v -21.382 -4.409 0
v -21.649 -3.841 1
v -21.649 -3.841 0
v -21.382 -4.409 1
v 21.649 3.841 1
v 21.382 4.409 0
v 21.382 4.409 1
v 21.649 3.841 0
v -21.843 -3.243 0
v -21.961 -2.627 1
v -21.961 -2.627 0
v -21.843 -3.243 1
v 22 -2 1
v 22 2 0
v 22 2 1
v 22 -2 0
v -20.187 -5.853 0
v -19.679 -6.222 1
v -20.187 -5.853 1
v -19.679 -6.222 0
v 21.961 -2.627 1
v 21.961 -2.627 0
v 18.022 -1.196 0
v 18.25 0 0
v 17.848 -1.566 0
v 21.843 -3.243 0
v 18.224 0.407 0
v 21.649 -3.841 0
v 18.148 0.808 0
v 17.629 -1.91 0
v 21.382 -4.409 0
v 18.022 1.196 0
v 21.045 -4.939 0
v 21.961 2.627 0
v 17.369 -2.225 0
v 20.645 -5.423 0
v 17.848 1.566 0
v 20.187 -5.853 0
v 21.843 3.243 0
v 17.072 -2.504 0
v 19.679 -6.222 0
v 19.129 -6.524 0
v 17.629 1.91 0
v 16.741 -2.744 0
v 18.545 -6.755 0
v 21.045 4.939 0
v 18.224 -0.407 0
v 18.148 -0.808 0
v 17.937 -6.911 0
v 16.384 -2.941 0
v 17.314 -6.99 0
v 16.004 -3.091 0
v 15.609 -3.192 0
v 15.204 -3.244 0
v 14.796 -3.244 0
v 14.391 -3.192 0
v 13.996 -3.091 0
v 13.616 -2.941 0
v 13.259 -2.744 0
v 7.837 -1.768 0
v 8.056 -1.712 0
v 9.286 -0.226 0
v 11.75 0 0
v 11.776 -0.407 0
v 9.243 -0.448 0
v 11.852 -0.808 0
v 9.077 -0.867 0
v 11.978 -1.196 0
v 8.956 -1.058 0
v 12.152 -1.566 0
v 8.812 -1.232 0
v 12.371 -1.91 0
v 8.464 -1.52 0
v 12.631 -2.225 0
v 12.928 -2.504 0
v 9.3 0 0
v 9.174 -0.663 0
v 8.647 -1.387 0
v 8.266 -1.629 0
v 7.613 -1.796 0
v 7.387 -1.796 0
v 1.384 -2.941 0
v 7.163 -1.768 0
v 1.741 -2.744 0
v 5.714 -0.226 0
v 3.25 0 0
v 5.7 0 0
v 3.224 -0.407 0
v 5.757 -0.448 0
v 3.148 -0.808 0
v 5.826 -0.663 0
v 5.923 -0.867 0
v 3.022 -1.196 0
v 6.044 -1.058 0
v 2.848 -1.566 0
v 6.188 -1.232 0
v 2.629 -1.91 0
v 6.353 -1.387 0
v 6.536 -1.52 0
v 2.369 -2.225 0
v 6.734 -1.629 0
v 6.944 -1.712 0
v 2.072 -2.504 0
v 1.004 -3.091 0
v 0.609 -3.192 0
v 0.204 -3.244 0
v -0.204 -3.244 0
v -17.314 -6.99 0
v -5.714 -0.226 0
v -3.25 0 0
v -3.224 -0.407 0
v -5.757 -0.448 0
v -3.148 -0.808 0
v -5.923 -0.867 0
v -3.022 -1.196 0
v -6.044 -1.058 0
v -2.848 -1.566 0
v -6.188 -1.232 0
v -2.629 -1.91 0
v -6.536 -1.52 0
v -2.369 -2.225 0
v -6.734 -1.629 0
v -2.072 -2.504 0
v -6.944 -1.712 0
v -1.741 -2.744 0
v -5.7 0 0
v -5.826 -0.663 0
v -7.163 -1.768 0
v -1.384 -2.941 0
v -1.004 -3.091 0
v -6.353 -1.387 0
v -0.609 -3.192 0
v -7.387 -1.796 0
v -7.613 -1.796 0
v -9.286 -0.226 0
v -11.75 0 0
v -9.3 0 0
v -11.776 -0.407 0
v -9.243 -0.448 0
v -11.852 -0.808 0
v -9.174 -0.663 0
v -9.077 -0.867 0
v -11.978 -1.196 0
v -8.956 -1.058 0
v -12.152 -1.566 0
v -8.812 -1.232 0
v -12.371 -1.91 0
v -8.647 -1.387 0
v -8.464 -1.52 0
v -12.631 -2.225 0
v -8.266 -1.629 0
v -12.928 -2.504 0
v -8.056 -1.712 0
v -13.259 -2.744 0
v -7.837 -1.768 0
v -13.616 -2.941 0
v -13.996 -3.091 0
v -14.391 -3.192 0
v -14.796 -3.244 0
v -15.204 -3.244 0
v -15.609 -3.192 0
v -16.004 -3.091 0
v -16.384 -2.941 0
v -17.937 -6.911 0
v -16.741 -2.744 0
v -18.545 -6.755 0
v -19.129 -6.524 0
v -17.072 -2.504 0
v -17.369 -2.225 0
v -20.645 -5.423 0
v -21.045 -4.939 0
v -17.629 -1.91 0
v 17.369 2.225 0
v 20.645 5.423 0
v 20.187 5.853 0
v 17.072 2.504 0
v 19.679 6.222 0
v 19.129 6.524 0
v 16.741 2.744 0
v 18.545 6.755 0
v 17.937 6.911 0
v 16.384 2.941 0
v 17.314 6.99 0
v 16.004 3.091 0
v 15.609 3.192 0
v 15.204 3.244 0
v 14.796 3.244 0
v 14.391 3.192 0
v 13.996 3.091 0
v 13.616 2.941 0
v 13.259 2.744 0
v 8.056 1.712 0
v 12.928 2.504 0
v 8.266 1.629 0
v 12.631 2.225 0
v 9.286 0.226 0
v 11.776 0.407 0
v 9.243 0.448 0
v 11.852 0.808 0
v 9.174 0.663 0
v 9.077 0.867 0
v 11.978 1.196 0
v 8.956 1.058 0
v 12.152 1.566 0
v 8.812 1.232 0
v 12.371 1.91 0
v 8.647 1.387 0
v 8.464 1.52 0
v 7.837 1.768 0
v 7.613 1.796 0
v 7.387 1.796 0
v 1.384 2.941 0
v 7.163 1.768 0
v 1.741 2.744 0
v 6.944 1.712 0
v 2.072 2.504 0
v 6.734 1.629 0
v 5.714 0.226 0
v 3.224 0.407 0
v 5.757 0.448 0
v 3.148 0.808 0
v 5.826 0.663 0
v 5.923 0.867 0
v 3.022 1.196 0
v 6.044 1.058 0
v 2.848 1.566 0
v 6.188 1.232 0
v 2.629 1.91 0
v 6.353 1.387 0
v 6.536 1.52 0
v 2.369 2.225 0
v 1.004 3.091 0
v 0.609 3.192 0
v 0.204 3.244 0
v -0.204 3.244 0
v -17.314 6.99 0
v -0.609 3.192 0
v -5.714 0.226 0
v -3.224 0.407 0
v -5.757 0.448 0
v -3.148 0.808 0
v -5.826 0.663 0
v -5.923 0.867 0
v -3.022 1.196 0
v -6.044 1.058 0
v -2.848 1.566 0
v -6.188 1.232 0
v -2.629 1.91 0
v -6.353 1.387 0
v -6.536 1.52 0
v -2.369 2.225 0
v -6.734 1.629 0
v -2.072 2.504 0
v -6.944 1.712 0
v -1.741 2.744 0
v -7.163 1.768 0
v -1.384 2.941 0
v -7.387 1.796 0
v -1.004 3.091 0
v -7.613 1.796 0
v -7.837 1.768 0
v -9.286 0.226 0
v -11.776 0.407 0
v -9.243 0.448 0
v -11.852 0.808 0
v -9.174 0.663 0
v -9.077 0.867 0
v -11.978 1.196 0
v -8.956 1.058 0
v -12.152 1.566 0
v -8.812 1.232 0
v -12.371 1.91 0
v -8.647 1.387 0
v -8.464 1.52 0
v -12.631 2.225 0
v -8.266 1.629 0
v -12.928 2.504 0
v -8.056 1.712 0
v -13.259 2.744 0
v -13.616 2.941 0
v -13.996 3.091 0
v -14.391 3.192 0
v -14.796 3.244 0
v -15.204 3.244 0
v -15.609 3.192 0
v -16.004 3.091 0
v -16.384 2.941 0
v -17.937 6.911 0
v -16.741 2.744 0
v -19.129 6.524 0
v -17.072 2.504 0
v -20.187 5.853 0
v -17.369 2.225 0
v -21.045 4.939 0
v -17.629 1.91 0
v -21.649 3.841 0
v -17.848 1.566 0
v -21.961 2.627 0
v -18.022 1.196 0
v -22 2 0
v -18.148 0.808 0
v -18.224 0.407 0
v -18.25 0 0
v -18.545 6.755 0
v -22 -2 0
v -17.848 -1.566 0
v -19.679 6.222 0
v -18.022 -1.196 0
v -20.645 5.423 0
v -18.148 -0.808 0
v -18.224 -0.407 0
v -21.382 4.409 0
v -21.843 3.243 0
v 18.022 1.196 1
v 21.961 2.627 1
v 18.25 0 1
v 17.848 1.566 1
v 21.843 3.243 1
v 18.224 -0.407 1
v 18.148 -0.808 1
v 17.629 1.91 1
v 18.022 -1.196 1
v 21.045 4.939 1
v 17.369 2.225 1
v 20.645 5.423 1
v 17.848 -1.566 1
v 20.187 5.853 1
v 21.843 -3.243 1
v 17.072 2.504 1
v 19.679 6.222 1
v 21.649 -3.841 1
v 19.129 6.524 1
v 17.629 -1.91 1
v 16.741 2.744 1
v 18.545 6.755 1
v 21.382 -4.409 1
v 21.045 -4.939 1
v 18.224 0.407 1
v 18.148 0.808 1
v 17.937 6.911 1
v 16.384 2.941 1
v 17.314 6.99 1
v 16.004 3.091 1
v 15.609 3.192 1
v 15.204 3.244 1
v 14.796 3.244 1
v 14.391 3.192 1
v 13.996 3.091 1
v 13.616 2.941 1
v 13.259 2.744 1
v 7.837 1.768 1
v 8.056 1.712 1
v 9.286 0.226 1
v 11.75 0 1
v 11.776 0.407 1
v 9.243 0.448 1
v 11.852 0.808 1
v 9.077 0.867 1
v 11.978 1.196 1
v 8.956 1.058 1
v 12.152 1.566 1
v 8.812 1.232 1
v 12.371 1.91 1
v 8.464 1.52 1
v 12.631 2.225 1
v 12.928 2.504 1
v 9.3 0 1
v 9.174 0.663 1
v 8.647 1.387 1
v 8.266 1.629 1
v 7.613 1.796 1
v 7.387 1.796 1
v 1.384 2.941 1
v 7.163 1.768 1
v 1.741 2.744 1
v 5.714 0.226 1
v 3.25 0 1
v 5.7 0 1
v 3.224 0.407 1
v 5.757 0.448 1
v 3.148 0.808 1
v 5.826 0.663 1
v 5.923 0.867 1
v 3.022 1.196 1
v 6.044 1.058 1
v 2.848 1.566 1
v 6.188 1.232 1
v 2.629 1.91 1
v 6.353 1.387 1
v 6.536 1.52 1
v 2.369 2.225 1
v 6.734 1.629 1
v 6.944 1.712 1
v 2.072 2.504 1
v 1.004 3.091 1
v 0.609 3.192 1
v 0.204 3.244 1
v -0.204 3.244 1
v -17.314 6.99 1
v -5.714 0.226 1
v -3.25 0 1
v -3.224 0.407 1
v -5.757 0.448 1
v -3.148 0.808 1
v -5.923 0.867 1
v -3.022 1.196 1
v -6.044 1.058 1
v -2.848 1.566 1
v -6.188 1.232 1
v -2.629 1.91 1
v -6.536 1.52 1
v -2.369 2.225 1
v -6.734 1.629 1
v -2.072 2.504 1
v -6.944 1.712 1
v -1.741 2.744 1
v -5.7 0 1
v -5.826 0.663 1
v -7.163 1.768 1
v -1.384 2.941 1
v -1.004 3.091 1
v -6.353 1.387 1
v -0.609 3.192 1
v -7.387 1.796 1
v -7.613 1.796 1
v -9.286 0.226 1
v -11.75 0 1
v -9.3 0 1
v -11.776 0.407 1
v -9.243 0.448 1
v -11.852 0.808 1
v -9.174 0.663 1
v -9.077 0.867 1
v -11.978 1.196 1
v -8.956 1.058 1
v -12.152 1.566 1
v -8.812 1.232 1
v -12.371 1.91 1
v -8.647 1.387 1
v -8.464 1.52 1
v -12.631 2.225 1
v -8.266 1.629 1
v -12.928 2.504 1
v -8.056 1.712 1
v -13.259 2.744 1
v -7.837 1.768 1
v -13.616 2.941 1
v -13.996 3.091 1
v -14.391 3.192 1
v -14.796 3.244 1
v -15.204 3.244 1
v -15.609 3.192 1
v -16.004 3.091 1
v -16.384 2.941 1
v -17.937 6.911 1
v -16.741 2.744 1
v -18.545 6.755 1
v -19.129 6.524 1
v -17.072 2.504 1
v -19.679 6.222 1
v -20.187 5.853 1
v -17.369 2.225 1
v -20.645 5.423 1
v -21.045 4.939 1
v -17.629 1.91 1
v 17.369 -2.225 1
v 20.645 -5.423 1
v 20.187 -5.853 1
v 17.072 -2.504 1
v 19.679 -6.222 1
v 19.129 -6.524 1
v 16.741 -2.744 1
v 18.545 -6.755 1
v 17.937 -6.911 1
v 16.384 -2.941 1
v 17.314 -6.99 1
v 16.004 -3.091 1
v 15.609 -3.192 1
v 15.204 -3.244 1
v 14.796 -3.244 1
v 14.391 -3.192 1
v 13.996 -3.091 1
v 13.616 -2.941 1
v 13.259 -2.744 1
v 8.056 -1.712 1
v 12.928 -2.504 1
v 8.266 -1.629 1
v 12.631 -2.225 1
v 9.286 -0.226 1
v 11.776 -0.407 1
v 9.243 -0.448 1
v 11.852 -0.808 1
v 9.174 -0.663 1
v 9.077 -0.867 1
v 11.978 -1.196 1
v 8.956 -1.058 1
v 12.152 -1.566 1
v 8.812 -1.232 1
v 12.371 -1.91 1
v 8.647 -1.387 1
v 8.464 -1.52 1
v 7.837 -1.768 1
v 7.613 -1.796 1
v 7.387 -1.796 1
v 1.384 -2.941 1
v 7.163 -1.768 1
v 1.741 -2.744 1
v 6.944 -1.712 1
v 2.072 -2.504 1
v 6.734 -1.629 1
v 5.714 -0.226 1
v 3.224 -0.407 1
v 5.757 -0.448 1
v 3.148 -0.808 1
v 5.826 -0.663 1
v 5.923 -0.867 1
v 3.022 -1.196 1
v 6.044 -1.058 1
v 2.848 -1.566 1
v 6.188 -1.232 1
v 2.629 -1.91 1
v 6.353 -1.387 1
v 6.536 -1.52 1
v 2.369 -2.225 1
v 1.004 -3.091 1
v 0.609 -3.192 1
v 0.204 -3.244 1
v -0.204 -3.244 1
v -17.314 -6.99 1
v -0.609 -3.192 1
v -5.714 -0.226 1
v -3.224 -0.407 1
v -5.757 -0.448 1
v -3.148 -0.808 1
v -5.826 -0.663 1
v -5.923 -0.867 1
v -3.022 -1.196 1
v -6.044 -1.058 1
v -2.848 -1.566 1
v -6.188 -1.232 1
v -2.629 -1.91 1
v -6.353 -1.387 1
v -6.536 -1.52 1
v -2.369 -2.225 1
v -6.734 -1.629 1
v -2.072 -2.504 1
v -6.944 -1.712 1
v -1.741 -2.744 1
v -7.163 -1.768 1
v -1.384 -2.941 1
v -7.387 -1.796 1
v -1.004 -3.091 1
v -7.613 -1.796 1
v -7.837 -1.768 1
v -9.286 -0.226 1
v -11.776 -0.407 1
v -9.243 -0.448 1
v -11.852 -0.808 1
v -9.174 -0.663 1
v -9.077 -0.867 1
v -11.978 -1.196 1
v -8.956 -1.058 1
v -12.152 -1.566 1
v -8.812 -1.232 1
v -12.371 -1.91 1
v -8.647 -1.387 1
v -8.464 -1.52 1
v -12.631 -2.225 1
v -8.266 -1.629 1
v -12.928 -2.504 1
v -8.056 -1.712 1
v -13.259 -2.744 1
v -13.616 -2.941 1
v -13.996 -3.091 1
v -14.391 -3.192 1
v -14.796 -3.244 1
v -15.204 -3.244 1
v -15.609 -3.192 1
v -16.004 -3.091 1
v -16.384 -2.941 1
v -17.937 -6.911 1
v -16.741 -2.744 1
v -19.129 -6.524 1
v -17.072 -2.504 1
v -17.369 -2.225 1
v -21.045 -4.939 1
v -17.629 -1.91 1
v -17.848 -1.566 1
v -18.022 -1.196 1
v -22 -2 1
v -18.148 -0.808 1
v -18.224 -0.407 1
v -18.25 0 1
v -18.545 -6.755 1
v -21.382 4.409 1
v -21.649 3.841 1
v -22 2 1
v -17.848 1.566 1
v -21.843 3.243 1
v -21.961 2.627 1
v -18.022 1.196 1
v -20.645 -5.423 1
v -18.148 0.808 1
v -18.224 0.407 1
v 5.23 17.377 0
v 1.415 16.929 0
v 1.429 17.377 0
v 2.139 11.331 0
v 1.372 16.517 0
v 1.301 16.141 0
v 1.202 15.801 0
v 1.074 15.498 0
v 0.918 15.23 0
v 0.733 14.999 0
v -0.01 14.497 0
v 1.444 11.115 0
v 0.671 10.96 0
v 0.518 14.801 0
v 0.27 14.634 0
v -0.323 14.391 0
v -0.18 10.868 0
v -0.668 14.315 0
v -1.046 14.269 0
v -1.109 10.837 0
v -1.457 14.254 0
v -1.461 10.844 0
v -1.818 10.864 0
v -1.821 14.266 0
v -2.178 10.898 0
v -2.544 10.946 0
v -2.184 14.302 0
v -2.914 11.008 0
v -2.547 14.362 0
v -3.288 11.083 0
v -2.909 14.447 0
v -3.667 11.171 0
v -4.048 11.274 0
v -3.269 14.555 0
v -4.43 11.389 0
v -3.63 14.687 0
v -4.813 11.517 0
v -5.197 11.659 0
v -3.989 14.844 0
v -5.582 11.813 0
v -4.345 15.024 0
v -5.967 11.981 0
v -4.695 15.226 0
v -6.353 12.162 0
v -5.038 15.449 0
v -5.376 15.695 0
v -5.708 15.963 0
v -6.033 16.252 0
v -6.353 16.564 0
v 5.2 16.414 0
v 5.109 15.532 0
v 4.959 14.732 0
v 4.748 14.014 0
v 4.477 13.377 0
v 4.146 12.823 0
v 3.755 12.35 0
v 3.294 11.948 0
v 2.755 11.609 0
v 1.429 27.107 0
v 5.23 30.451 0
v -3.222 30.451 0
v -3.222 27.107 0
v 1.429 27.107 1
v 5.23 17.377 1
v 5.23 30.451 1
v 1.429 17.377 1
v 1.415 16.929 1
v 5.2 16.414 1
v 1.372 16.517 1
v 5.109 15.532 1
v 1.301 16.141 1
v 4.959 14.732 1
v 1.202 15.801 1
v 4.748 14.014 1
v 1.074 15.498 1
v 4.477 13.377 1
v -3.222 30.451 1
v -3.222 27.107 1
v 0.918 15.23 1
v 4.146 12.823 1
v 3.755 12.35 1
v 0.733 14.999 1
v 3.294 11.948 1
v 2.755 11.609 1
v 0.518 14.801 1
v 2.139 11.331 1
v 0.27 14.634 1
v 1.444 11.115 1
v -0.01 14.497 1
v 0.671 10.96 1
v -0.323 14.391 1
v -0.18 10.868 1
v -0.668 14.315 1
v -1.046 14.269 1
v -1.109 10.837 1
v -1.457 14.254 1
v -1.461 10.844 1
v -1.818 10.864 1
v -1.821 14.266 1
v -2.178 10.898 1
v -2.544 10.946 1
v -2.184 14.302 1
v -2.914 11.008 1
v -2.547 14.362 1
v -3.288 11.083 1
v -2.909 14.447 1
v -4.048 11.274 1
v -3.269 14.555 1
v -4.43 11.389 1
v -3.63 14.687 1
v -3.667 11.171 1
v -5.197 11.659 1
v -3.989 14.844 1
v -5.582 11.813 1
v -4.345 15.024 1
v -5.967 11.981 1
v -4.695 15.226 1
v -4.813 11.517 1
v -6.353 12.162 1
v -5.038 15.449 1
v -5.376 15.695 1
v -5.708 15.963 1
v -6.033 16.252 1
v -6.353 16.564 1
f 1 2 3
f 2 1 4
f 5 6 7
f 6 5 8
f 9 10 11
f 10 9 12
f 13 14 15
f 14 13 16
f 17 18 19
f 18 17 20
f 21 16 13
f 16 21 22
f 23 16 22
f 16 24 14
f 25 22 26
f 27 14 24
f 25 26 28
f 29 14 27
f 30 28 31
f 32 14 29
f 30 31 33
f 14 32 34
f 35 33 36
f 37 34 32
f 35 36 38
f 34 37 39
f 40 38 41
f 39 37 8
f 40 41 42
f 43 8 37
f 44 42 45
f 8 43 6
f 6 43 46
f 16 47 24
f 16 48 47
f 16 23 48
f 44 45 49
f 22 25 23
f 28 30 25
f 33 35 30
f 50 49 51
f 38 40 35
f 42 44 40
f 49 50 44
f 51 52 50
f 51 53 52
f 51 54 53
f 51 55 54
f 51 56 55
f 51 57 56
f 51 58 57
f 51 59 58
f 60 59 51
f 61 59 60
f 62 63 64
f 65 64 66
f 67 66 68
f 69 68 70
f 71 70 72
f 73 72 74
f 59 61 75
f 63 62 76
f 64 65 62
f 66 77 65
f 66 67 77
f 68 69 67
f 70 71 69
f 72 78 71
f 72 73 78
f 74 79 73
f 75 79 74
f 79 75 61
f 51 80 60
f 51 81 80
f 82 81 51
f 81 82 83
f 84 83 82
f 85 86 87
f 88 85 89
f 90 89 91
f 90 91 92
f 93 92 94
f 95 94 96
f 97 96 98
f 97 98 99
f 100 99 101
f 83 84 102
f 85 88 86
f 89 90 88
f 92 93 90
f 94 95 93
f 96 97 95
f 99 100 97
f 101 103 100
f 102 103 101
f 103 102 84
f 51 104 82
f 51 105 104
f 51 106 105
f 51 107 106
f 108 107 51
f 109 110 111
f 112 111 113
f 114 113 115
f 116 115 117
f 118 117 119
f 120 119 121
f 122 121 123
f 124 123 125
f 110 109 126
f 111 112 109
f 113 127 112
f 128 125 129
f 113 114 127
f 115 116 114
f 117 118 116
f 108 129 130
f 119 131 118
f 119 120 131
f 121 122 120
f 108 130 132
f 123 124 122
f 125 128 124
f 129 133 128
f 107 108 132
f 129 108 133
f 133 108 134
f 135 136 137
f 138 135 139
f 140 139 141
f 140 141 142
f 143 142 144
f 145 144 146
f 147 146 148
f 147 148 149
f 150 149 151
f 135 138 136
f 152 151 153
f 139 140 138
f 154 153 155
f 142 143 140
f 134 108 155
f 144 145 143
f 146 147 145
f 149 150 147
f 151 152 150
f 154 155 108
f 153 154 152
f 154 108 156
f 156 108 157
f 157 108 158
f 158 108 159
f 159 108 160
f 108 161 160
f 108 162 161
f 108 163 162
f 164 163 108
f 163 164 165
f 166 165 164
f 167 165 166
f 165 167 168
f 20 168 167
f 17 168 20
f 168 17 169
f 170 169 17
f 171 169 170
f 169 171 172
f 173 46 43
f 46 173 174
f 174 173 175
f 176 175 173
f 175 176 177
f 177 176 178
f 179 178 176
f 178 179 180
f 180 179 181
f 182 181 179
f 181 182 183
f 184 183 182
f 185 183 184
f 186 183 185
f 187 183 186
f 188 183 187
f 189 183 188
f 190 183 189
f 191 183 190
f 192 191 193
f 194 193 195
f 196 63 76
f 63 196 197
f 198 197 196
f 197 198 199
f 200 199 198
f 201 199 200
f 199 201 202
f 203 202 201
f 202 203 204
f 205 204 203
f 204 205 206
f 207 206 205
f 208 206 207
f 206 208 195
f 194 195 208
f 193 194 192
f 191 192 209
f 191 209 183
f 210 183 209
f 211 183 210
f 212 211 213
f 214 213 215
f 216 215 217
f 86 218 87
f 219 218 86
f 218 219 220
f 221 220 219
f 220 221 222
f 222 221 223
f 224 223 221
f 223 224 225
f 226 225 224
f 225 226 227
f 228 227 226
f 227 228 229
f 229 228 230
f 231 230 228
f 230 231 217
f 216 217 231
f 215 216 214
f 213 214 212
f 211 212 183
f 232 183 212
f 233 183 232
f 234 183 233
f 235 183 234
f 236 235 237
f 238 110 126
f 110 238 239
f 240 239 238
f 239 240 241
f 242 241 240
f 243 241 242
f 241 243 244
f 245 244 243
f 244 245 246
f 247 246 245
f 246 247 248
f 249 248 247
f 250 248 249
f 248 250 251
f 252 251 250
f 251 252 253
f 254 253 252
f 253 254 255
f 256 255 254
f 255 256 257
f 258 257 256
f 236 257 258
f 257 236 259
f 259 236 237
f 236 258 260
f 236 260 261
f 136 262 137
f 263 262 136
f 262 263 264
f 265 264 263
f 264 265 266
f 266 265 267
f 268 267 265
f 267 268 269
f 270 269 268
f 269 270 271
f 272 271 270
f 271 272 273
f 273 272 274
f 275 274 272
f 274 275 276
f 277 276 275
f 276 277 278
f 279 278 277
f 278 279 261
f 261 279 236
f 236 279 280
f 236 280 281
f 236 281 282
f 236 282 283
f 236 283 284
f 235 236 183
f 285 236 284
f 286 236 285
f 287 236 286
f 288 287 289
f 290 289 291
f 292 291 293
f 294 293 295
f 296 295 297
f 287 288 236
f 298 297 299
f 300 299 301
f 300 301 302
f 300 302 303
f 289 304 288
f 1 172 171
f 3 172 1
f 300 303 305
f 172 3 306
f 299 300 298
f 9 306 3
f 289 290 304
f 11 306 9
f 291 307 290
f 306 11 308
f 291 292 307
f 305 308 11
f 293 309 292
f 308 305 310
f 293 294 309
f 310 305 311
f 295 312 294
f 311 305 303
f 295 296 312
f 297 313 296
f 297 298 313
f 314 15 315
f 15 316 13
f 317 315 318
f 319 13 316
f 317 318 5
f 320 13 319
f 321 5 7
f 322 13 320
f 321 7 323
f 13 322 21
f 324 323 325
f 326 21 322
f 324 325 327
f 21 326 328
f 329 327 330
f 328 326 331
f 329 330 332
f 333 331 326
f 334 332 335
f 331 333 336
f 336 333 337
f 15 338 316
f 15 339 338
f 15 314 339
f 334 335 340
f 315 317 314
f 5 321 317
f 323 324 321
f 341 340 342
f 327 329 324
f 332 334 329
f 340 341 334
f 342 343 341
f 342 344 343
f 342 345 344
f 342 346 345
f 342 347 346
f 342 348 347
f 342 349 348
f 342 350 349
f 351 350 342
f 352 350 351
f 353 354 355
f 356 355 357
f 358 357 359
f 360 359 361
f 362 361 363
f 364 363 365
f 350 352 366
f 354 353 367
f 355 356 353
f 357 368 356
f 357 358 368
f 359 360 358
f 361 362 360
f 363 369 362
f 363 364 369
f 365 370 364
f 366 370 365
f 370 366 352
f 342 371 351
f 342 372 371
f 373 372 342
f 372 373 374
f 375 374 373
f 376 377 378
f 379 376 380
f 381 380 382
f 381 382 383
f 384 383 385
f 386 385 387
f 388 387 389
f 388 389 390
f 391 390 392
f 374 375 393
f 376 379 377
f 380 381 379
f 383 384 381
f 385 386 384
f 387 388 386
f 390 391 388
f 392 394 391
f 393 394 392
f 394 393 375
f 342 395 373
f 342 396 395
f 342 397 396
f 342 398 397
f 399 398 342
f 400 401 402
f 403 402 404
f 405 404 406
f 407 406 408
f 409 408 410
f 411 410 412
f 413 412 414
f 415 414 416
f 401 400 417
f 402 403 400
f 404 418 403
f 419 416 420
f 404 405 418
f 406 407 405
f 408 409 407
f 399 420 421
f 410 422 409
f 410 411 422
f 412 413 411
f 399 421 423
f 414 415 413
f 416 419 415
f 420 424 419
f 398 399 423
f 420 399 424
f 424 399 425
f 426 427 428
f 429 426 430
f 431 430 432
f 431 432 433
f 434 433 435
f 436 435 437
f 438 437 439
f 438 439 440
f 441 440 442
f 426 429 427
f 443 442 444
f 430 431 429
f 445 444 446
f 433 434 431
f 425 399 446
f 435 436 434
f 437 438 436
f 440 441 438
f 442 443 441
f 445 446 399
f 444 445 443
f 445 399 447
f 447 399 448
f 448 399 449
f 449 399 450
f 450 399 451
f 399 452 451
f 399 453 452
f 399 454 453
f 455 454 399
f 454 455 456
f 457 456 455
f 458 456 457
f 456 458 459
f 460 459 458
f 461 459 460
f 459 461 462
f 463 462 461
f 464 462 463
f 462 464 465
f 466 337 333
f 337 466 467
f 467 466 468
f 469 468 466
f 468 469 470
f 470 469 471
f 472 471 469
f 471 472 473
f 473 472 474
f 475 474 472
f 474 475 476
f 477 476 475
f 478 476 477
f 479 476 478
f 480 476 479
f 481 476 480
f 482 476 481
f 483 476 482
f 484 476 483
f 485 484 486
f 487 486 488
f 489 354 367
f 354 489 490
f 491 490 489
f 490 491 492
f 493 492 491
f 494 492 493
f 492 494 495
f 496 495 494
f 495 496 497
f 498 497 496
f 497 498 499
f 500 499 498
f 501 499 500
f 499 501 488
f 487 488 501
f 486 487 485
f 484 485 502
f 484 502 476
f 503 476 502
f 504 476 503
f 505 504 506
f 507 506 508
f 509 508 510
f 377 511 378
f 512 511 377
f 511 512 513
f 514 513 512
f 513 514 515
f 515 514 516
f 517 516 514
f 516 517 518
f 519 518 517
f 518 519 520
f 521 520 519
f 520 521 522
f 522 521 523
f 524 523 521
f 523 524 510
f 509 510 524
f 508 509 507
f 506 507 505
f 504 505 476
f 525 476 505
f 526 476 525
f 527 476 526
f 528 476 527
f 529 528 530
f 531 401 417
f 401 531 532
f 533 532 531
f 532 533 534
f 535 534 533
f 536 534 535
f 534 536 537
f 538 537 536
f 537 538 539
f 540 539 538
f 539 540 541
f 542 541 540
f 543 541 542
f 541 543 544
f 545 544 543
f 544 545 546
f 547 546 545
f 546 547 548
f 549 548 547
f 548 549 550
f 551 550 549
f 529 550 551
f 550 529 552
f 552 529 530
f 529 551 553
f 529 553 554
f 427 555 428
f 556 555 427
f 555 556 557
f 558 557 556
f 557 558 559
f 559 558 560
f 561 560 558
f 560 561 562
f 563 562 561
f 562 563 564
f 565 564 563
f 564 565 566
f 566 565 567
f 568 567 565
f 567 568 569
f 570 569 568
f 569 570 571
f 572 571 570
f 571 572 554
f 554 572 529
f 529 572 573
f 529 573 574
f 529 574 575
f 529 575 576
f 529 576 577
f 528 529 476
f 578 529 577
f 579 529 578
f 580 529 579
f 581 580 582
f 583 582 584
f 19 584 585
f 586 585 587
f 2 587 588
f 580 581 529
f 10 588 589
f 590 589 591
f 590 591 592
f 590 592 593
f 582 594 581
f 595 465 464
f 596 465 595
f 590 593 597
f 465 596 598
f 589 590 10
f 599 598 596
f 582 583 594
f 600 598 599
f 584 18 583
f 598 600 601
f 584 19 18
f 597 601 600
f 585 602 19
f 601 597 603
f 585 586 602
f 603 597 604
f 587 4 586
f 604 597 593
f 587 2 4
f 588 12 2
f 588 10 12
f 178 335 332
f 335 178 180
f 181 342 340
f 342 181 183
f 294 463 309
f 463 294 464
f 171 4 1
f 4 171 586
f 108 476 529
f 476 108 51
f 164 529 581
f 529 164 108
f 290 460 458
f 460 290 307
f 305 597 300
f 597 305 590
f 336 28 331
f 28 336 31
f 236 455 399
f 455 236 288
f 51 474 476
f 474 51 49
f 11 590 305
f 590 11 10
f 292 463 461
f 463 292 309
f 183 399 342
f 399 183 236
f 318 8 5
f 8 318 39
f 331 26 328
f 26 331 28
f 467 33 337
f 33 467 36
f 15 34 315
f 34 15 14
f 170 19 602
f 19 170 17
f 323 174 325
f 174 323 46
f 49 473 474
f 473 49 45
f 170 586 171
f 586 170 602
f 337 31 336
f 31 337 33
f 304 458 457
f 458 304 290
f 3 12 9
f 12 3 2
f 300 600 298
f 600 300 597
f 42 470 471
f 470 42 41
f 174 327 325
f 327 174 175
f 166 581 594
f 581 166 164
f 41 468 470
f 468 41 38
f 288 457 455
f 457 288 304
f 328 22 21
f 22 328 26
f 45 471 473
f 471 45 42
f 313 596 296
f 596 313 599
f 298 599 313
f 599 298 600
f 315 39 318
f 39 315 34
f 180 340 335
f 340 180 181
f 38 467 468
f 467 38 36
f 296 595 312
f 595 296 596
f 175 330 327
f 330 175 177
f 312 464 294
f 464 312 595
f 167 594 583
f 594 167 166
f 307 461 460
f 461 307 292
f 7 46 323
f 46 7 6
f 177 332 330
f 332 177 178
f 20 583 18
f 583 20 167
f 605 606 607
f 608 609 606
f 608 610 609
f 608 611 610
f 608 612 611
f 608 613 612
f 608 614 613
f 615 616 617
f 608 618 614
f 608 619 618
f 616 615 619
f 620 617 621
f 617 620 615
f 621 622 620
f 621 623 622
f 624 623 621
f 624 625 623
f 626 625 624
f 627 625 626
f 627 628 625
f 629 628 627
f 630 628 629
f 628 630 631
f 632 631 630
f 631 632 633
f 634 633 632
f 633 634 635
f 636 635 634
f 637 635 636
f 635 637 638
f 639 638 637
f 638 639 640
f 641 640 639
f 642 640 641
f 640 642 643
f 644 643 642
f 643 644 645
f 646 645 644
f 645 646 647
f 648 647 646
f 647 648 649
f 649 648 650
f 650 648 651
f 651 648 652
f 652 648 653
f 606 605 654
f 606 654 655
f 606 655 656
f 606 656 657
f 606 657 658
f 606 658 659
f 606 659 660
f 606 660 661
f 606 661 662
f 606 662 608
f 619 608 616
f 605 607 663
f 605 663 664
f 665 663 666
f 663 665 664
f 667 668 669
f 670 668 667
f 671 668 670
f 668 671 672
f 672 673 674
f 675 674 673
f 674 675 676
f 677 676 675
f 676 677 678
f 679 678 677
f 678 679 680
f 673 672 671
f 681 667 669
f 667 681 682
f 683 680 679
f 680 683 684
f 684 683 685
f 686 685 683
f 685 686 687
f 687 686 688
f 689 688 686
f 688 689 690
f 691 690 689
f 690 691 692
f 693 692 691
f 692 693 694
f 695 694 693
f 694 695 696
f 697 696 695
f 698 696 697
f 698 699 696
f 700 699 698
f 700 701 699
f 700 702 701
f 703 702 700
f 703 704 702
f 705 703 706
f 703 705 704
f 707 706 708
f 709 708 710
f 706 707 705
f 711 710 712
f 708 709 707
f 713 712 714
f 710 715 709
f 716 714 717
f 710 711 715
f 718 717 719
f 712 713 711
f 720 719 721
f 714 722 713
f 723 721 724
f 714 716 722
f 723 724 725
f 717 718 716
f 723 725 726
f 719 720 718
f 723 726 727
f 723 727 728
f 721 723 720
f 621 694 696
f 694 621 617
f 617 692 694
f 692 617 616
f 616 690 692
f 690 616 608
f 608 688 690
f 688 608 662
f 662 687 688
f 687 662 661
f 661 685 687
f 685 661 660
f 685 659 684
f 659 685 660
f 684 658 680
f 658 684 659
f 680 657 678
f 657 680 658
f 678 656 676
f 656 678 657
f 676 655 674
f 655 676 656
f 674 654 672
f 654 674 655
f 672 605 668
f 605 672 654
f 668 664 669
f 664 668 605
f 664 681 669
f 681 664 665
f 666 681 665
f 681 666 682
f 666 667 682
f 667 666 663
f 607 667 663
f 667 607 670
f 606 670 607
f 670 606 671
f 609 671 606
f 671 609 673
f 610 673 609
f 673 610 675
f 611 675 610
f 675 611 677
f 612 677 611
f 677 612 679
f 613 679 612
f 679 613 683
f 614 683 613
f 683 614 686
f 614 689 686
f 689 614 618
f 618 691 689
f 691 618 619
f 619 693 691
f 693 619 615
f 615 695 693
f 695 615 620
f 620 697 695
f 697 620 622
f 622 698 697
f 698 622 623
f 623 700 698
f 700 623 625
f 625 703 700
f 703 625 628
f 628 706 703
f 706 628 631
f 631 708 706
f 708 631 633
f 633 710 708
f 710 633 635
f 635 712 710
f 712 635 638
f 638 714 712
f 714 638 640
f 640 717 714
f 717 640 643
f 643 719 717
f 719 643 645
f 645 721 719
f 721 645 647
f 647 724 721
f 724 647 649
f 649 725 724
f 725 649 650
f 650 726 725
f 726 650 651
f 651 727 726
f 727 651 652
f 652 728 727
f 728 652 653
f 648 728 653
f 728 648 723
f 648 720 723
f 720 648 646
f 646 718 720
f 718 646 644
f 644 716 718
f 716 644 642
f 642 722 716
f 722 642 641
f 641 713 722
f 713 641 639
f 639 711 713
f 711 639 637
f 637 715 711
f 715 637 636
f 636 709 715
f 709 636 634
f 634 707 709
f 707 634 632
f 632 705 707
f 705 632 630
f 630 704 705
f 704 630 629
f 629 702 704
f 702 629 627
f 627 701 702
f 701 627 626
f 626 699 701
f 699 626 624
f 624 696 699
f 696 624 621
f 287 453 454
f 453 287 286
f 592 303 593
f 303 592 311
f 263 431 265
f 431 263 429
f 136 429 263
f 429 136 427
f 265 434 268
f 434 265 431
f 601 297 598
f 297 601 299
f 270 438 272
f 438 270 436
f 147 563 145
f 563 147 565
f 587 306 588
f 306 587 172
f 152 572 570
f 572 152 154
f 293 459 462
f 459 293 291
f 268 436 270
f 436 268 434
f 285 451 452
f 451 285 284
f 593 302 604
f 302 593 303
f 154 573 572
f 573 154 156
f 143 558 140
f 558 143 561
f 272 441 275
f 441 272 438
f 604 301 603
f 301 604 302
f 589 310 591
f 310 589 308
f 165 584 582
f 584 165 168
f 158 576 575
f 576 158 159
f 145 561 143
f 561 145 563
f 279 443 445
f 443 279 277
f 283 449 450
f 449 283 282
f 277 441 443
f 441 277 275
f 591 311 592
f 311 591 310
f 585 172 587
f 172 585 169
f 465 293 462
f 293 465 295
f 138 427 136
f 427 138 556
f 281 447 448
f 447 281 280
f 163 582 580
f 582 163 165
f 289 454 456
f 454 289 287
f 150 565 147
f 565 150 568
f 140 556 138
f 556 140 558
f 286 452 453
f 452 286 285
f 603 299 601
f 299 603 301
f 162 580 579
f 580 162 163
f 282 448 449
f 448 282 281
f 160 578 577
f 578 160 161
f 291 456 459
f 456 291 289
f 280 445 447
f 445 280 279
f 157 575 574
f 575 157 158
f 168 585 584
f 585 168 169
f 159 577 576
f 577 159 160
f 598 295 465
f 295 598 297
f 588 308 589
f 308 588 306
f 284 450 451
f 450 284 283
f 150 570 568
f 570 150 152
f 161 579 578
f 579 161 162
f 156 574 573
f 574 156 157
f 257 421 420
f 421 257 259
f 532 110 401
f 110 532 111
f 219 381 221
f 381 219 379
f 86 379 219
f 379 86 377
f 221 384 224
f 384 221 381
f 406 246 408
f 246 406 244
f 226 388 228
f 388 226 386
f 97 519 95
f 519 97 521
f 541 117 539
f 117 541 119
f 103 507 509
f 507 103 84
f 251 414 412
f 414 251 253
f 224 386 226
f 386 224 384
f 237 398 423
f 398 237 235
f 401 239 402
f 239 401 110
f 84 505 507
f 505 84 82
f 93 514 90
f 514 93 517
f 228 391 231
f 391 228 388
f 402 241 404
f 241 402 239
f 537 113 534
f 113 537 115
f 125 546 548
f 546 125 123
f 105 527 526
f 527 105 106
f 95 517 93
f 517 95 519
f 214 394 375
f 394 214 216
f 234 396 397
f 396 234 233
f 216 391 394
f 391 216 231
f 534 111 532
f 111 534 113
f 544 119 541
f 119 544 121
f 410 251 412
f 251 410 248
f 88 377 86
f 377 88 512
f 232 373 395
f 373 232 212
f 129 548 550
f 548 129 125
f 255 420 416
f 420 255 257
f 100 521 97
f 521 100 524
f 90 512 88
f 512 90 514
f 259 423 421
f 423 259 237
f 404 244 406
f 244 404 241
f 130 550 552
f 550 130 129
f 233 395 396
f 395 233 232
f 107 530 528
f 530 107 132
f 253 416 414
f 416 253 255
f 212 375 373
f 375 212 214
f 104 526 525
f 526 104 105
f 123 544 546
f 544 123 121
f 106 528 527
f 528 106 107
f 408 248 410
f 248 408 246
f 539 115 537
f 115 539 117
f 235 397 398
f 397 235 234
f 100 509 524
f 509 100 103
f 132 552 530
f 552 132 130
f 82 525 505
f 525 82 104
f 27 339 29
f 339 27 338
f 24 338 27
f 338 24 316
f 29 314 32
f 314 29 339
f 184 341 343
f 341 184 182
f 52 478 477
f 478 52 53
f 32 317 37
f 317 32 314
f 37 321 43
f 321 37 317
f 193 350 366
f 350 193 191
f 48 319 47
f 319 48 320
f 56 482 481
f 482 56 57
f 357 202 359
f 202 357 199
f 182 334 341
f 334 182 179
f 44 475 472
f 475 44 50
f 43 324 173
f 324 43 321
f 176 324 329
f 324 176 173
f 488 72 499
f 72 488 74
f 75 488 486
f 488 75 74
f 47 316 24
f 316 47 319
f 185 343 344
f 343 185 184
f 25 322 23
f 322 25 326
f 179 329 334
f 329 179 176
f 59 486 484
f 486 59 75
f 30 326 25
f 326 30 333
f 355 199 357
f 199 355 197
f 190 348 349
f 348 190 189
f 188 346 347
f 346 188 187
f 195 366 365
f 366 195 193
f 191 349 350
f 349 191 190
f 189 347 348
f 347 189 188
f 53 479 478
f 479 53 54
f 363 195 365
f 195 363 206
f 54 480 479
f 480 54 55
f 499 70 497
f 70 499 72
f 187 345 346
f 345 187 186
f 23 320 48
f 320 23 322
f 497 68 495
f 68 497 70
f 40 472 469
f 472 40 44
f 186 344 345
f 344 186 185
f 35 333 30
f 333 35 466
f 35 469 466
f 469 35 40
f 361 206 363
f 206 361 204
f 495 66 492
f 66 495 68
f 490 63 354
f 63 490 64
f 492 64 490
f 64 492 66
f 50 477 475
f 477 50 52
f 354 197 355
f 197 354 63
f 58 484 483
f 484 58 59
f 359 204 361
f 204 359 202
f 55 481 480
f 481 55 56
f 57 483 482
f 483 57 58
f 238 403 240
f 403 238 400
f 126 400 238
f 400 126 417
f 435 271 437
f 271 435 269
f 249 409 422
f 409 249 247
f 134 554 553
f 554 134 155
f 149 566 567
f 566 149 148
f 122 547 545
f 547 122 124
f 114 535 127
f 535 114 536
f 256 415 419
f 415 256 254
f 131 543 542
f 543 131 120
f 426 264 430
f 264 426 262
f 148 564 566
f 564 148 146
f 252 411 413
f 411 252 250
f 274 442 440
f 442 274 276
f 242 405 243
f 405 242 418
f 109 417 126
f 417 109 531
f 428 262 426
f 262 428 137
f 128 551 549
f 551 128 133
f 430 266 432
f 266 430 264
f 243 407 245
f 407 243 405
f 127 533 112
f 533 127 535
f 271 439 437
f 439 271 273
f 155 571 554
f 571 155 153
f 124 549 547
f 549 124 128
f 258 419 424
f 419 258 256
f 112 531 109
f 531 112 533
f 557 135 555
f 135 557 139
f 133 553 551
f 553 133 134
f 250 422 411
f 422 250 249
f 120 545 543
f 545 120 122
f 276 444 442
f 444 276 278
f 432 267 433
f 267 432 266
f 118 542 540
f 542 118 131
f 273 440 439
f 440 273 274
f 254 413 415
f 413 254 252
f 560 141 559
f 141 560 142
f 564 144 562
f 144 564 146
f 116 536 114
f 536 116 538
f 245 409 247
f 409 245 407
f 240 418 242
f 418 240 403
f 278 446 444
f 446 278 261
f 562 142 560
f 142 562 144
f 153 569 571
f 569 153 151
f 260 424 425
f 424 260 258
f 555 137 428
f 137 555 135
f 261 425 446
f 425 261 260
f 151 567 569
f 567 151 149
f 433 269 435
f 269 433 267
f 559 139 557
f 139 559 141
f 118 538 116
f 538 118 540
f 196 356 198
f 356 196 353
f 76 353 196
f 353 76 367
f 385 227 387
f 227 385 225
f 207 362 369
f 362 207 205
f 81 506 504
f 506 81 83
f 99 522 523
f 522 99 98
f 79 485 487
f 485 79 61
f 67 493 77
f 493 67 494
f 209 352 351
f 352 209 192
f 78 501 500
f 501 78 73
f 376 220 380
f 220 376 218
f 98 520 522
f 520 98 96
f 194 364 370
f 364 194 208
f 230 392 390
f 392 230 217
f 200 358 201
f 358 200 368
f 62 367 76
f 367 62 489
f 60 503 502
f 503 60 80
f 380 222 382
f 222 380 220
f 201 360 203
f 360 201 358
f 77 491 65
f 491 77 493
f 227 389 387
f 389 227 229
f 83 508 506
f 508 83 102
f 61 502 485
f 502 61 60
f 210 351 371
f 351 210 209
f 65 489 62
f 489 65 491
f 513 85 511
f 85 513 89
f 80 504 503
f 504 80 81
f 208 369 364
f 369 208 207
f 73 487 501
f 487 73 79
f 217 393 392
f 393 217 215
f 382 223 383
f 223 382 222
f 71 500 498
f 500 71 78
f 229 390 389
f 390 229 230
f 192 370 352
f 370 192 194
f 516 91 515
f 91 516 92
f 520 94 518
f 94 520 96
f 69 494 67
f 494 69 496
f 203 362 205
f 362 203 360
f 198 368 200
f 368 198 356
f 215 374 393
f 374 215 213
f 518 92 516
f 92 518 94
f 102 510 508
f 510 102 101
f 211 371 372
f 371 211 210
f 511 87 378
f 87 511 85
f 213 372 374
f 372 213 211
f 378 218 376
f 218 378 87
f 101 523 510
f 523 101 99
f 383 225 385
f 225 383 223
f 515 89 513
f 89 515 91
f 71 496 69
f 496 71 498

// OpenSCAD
$fn = 50;


difference() {
	union() {
		hull() {
			translate(v = [-17.0000000000, 2.0000000000, 0]) {
				cylinder(h = 1, r = 5);
			}
			translate(v = [17.0000000000, 2.0000000000, 0]) {
				cylinder(h = 1, r = 5);
			}
			translate(v = [-17.0000000000, -2.0000000000, 0]) {
				cylinder(h = 1, r = 5);
			}
			translate(v = [17.0000000000, -2.0000000000, 0]) {
				cylinder(h = 1, r = 5);
			}
		}
		translate(v = [0, 30.0000000000, 0]) {
			linear_extrude(height = 1) {
				text(font = "DejaVu Sans Mono:style=Bold", halign = "center", size = 19.0000000000, text = "J", valign = "top");
			}
		}
	}
	union() {
		translate(v = [-15.0000000000, 0.0000000000, 0]) {
			translate(v = [0, 0, -100]) {
				cylinder(h = 200, r = 3.2500000000);
			}
		}
		translate(v = [0, 0, -100]) {
			cylinder(h = 200, r = 3.2500000000);
		}
		translate(v = [15.0000000000, 0.0000000000, 0]) {
			translate(v = [0, 0, -100]) {
				cylinder(h = 200, r = 3.2500000000);
			}
		}
		translate(v = [-15.0000000000, 0.0000000000, 0]) {
			translate(v = [0, 0, -100]) {
				cylinder(h = 200, r = 1.8000000000);
			}
		}
		translate(v = [-7.5000000000, 0.0000000000, 0]) {
			translate(v = [0, 0, -100]) {
				cylinder(h = 200, r = 1.8000000000);
			}
		}
		translate(v = [0, 0, -100]) {
			cylinder(h = 200, r = 1.8000000000);
		}
		translate(v = [7.5000000000, 0.0000000000, 0]) {
			translate(v = [0, 0, -100]) {
				cylinder(h = 200, r = 1.8000000000);
			}
		}
		translate(v = [15.0000000000, 0.0000000000, 0]) {
			translate(v = [0, 0, -100]) {
				cylinder(h = 200, r = 1.8000000000);
			}
		}
	}
}
